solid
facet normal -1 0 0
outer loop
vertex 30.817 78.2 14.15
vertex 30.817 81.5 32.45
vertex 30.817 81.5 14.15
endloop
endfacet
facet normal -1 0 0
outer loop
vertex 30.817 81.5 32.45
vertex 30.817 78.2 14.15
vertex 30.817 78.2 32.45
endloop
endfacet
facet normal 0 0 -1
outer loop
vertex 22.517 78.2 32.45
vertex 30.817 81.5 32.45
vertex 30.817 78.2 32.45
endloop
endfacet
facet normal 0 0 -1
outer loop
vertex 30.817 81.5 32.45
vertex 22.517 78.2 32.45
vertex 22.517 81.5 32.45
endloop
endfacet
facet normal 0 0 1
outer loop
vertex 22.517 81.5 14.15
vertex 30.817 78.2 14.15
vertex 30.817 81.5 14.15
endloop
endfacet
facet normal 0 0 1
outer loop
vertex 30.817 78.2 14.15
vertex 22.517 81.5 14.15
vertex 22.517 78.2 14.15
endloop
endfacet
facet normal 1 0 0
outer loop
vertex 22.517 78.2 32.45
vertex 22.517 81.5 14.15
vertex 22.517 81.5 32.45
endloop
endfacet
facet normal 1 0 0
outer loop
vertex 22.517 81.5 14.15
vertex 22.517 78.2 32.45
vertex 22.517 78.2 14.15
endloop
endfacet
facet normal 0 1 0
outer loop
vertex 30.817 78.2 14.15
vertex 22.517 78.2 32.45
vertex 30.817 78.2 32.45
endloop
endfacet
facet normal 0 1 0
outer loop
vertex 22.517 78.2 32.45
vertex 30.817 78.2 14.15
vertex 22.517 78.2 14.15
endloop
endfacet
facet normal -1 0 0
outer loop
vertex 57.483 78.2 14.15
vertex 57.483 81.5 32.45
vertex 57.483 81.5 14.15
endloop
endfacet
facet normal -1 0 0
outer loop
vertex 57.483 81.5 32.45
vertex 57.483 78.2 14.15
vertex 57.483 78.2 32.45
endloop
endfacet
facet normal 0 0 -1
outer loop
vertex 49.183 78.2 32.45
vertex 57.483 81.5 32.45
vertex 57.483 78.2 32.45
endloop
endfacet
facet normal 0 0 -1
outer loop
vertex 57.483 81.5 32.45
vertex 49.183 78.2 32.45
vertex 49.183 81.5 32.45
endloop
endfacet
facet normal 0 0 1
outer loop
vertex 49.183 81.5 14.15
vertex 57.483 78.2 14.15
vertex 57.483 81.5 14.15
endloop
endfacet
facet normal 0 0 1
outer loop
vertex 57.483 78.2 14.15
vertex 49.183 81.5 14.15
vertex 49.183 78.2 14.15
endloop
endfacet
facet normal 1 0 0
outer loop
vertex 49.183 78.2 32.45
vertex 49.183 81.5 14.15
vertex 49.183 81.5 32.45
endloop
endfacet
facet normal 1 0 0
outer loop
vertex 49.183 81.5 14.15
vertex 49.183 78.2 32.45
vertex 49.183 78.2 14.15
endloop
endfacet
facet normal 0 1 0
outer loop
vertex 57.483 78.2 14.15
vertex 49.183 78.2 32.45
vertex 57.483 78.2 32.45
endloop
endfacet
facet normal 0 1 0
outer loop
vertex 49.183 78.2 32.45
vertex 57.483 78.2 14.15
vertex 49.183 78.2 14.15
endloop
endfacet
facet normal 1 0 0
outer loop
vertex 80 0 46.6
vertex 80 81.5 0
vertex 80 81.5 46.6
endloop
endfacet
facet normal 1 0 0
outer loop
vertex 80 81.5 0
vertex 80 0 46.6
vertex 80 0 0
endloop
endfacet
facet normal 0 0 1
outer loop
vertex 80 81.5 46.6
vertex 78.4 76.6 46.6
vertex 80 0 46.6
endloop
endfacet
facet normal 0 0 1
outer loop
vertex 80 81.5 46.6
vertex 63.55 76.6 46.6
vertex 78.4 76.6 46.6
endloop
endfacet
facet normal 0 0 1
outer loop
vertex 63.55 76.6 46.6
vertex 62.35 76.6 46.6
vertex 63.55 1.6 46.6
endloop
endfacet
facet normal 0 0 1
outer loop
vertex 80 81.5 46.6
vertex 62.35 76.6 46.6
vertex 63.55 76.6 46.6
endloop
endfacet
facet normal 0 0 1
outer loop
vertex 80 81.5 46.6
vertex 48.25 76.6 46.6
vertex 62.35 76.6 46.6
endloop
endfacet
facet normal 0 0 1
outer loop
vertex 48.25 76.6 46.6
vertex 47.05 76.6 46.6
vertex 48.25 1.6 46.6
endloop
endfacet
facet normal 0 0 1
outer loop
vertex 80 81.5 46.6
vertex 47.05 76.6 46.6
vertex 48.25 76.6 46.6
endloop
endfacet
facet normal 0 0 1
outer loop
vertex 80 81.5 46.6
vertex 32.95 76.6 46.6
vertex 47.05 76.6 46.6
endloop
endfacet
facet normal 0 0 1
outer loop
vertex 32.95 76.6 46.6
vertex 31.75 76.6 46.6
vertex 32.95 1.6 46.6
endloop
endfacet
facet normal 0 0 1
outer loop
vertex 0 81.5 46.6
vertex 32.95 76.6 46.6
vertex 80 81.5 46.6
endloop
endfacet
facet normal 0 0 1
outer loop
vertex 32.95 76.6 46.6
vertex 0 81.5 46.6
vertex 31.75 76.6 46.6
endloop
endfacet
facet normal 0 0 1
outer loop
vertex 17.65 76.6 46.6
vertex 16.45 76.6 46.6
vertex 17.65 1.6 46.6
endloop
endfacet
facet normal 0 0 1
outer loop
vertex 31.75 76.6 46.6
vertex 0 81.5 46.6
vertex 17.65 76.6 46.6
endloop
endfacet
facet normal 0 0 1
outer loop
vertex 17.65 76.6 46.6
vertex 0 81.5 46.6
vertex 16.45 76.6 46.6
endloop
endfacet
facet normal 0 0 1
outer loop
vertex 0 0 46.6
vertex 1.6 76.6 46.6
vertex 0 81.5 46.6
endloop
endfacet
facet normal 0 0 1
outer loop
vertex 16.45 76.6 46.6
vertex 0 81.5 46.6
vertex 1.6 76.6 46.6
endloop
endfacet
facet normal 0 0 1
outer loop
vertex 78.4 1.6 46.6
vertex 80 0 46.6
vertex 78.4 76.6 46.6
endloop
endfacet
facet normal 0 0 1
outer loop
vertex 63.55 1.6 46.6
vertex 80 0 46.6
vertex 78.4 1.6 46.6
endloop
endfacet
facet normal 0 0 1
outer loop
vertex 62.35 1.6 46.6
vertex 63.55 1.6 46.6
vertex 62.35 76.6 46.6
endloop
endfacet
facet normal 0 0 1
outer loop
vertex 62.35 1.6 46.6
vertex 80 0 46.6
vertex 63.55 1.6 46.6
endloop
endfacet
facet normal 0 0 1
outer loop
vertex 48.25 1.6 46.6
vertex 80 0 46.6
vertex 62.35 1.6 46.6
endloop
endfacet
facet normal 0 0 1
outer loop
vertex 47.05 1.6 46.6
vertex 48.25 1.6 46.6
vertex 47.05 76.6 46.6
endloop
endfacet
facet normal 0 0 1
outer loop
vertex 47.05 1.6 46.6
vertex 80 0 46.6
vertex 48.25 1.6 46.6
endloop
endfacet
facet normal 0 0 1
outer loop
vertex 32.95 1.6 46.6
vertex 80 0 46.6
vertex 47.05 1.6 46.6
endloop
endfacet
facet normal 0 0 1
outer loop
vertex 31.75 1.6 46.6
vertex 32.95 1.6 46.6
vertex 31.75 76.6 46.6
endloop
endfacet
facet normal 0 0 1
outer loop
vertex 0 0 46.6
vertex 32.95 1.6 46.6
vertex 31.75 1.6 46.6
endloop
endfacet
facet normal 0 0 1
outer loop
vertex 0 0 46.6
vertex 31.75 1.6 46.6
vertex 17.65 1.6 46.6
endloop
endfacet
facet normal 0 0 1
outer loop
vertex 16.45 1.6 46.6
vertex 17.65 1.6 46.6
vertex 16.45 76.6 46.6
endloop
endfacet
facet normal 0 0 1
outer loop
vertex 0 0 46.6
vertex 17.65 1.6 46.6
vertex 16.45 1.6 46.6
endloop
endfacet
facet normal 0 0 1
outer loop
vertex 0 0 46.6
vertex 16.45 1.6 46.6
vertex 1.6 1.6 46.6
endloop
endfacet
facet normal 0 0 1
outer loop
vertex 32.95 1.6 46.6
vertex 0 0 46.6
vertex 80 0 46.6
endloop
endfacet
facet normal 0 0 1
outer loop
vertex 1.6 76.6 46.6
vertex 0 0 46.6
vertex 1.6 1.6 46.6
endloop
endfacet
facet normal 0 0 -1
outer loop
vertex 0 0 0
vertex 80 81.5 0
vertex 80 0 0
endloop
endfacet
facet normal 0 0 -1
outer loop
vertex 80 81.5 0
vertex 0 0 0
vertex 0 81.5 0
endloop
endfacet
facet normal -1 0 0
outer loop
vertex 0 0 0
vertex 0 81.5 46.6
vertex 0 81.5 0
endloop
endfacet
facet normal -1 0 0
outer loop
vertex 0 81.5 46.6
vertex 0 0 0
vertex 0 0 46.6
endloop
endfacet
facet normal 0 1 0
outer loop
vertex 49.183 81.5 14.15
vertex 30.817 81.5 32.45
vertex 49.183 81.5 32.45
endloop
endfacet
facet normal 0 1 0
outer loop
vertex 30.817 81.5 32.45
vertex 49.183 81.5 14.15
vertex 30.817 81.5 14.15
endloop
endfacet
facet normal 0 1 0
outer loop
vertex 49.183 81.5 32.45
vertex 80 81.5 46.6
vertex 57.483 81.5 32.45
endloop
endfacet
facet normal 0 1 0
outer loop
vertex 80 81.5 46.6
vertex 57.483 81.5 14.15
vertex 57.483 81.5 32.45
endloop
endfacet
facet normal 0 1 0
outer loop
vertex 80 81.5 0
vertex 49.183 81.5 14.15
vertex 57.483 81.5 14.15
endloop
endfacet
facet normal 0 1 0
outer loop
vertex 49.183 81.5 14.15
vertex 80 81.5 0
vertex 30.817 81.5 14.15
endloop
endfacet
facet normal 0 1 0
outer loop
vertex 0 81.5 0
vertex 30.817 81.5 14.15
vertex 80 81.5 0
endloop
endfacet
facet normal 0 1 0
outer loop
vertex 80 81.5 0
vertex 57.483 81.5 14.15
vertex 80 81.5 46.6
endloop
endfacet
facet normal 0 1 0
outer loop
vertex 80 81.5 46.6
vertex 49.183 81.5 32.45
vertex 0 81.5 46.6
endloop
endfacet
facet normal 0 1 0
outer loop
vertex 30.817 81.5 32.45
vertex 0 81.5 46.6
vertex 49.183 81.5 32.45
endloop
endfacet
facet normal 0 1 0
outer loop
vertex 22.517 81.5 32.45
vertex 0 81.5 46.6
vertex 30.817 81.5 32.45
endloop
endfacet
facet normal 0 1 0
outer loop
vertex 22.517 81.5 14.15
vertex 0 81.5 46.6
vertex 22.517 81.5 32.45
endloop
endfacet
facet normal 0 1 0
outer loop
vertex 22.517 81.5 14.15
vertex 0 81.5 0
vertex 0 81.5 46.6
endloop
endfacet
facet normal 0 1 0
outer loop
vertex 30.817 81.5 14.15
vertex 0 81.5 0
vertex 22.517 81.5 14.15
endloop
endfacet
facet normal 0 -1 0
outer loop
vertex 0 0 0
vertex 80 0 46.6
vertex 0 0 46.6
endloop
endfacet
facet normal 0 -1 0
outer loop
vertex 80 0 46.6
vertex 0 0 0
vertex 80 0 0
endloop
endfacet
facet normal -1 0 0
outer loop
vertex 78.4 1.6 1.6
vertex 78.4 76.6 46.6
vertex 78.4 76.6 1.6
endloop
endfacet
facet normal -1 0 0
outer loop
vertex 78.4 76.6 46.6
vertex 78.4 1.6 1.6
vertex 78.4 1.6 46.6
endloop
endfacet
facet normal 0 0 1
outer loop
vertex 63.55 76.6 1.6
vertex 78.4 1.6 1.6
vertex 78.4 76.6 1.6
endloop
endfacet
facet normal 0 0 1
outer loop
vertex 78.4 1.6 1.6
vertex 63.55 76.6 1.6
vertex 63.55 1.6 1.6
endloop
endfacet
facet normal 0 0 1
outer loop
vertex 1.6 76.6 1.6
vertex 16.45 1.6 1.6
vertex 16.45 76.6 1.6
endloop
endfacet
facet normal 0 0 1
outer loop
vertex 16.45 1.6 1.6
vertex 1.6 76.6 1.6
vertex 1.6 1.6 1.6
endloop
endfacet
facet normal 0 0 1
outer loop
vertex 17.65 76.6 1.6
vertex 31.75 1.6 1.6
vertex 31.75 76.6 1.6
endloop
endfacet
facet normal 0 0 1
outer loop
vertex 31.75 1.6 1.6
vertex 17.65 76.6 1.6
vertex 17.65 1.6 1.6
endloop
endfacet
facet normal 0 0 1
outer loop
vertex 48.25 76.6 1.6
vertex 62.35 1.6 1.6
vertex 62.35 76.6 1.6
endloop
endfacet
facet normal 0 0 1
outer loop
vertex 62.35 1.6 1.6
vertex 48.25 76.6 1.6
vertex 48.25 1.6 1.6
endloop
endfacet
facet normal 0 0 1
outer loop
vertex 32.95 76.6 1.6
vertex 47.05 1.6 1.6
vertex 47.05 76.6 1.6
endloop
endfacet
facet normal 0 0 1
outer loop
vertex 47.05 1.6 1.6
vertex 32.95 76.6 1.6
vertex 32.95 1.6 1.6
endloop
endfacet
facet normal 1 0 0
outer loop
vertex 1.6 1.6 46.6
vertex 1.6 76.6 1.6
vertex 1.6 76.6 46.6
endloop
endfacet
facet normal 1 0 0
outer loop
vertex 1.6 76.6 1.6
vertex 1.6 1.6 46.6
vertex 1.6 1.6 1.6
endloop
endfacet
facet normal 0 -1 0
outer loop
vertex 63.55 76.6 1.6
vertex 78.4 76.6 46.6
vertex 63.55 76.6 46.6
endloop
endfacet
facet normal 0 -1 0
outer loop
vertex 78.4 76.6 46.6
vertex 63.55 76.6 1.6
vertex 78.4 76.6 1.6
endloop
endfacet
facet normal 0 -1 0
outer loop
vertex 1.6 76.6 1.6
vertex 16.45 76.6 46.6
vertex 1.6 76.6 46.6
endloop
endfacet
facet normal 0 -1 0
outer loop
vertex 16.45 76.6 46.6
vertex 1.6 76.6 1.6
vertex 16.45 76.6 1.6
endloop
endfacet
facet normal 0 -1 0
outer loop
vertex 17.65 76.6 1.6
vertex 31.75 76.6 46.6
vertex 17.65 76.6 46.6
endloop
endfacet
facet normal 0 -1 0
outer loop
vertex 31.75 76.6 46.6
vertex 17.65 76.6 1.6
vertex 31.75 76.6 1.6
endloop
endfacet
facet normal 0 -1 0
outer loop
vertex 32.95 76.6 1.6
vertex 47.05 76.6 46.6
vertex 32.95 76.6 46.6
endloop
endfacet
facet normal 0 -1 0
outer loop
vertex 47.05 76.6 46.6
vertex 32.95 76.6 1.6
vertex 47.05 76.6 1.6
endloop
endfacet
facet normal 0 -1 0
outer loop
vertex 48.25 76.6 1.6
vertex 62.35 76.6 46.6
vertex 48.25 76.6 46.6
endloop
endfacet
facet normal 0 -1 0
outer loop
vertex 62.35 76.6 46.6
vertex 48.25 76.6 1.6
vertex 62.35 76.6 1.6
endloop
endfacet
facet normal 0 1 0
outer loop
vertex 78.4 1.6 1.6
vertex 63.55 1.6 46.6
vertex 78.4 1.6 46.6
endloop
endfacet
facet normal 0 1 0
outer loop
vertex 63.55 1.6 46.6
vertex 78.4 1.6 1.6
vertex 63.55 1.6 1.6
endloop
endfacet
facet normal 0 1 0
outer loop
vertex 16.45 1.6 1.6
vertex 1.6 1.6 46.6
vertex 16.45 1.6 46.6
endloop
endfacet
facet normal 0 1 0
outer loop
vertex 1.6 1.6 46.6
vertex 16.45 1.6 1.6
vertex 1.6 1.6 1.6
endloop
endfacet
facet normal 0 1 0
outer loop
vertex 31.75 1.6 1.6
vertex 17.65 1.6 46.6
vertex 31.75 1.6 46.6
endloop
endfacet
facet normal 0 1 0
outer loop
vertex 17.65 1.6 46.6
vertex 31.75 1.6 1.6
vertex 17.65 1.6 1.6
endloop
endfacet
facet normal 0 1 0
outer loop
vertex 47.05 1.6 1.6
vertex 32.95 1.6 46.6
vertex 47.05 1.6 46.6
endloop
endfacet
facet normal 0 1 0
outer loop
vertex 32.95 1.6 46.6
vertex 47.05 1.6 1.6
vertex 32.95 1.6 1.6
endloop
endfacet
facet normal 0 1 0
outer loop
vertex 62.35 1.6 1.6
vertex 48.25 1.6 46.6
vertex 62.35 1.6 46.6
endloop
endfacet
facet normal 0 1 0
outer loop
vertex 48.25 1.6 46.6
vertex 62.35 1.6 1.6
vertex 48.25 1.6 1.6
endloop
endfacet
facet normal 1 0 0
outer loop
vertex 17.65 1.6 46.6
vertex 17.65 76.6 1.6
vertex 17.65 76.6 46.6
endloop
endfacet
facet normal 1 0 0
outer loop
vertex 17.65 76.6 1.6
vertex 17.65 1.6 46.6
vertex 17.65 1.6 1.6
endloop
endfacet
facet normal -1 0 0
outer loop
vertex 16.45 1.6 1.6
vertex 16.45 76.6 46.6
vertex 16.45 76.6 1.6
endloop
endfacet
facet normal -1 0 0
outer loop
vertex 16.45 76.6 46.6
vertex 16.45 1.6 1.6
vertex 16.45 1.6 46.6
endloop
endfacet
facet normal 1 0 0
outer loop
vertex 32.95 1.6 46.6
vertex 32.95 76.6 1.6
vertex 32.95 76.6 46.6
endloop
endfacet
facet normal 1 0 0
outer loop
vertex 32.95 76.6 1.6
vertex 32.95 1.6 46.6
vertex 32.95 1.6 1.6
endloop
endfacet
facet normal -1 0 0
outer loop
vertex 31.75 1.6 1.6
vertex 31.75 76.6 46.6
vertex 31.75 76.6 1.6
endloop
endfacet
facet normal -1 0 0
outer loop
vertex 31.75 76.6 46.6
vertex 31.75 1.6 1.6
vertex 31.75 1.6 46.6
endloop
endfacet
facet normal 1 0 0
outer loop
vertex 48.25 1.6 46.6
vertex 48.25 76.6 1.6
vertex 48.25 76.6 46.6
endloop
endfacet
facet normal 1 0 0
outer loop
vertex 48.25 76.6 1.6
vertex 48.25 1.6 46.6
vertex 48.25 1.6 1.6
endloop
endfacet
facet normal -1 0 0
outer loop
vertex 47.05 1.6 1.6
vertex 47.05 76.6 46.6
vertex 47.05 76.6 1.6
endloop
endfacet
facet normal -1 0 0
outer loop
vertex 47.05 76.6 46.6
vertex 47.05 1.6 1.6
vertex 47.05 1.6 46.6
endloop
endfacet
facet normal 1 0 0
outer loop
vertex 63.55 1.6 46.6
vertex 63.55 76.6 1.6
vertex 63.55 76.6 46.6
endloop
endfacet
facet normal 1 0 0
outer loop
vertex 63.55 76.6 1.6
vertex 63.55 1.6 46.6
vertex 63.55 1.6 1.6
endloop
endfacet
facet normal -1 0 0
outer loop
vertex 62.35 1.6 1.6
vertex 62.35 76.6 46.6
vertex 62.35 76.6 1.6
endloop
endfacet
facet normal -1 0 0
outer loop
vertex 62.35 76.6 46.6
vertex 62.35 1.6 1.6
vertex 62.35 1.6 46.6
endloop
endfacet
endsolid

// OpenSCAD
// file: BOSL2/std.scad
// Minimal BOSL2 compatibility shim for bundled gallery models.
// It implements only the helpers used by the imported OpenSCAD projects.

CENTER = [0, 0, 0];
BOTTOM = [0, 0, -1];
TOP = [0, 0, 1];
LEFT = [-1, 0, 0];
RIGHT = [1, 0, 0];
FRONT = [0, -1, 0];
BACK = [0, 1, 0];

module up(z=0) {
    translate([0, 0, z]) children();
}

module down(z=0) {
    translate([0, 0, -z]) children();
}

module attach(anchor=CENTER) {
    children();
}

module cuboid(size=[1, 1, 1], anchor=CENTER) {
    center = anchor == CENTER;
    translate(center ? [0, 0, 0] : [0, 0, size[2] / 2])
        cube(size, center=true);
    children();
}

module xcyl(h=1, r=1, anchor=CENTER) {
    center = anchor == CENTER;
    translate(center ? [0, 0, 0] : [h / 2, 0, 0])
        rotate([0, 90, 0])
            cylinder(h=h, r=r, center=true);
}
// main file
include <BOSL2/std.scad>

// ===========================================
// Boîte de rangement pour chapeaux d'infuseur
// Fixation murale magnétique sur chaudière
// ===========================================

// --- Chapeaux d'infuseur ---
cap_diameter  = 75;   // diamètre max (mm)
cap_thickness = 15;   // épaisseur max (mm)
num_caps      = 5;    // nombre de chapeaux à stocker

// --- Aimants 8 x 18 x 1.5 mm ---
mag            = [8, 18, 1.5];
mag_stack      = 2;   // aimants empilés par logement
num_mag_pockets = 2;  // nombre de logements

// --- Impression 3D (buse 0.4, couche 0.2) ---
nozzle  = 0.4;
layer_h = 0.2;
tol     = 0.3;    // tolérance générale par côté
mag_tol = 0.15;   // tolérance aimants (ajustement serré)

// --- Construction ---
wall      = 1.6;   // parois latérales (4 périmètres)
floor_t   = 1.6;   // fond (8 couches)
divider_t = 1.2;  // épaisseur séparateurs (3 périmètres)

// --- Dimensions calculées ---

// Logement aimant
mag_pw = mag.x + 2 * mag_tol;           // largeur poche (X)
mag_ph = mag.y + 2 * mag_tol;           // hauteur poche (Z)
mag_pd = mag.z * mag_stack + 2 * mag_tol; // profondeur poche (Y)

// Intérieur boîte
inner_w = num_caps * (cap_thickness + tol) + tol;  // largeur
inner_d = cap_diameter;                                // profondeur = diamètre complet
inner_h = cap_diameter * 0.6;                          // hauteur (~45mm, chapeaux dépassent d'1/3)

// Épaisseur paroi arrière : paroi intérieure pleine + logement aimants ouvert à l'arrière
back_wall = wall + mag_pd;

// Extérieur boîte
outer_w = inner_w + 2 * wall;
outer_d = inner_d + wall + back_wall;
outer_h = inner_h + floor_t;

// --- Modules ---

module magnet_pocket() {
    cube([mag_pw, mag_pd, mag_ph]);
}

module magnet_pockets() {
    spacing = outer_w / (num_mag_pockets + 1);
    for (i = [1:num_mag_pockets]) {
        translate([
            spacing * i - mag_pw / 2,
            outer_d - mag_pd,
            outer_h / 2 - mag_ph / 2
        ])
            // Traverse toute la paroi arrière (aimants affleurants)
            cube([mag_pw, mag_pd + 1, mag_ph]);
    }
}

module dividers() {
    for (i = [1:num_caps - 1]) {
        translate([
            wall + i * (cap_thickness + tol) + tol/2 - divider_t/2,
            wall,
            floor_t
        ])
            cube([divider_t, inner_d, inner_h]);
    }
}

module box() {
    union() {
        difference() {
            // Coque extérieure
            cube([outer_w, outer_d, outer_h]);

            // Cavité intérieure (ouverte en haut)
            translate([wall, wall, floor_t])
                cube([inner_w, inner_d, inner_h + 1]);

            // Logements aimants (traversants à l'arrière)
            magnet_pockets();
        }

        // Séparateurs (ajoutés après la cavité pour rester solides)
        dividers();
    }
}

// --- Rendu ---
box();

// --- Info debug ---
echo(str("Dimensions extérieures: ",
    outer_w, " x ", outer_d, " x ", outer_h, " mm"));
echo(str("Poche aimant: ",
    mag_pw, " x ", mag_pd, " x ", mag_ph, " mm"));
